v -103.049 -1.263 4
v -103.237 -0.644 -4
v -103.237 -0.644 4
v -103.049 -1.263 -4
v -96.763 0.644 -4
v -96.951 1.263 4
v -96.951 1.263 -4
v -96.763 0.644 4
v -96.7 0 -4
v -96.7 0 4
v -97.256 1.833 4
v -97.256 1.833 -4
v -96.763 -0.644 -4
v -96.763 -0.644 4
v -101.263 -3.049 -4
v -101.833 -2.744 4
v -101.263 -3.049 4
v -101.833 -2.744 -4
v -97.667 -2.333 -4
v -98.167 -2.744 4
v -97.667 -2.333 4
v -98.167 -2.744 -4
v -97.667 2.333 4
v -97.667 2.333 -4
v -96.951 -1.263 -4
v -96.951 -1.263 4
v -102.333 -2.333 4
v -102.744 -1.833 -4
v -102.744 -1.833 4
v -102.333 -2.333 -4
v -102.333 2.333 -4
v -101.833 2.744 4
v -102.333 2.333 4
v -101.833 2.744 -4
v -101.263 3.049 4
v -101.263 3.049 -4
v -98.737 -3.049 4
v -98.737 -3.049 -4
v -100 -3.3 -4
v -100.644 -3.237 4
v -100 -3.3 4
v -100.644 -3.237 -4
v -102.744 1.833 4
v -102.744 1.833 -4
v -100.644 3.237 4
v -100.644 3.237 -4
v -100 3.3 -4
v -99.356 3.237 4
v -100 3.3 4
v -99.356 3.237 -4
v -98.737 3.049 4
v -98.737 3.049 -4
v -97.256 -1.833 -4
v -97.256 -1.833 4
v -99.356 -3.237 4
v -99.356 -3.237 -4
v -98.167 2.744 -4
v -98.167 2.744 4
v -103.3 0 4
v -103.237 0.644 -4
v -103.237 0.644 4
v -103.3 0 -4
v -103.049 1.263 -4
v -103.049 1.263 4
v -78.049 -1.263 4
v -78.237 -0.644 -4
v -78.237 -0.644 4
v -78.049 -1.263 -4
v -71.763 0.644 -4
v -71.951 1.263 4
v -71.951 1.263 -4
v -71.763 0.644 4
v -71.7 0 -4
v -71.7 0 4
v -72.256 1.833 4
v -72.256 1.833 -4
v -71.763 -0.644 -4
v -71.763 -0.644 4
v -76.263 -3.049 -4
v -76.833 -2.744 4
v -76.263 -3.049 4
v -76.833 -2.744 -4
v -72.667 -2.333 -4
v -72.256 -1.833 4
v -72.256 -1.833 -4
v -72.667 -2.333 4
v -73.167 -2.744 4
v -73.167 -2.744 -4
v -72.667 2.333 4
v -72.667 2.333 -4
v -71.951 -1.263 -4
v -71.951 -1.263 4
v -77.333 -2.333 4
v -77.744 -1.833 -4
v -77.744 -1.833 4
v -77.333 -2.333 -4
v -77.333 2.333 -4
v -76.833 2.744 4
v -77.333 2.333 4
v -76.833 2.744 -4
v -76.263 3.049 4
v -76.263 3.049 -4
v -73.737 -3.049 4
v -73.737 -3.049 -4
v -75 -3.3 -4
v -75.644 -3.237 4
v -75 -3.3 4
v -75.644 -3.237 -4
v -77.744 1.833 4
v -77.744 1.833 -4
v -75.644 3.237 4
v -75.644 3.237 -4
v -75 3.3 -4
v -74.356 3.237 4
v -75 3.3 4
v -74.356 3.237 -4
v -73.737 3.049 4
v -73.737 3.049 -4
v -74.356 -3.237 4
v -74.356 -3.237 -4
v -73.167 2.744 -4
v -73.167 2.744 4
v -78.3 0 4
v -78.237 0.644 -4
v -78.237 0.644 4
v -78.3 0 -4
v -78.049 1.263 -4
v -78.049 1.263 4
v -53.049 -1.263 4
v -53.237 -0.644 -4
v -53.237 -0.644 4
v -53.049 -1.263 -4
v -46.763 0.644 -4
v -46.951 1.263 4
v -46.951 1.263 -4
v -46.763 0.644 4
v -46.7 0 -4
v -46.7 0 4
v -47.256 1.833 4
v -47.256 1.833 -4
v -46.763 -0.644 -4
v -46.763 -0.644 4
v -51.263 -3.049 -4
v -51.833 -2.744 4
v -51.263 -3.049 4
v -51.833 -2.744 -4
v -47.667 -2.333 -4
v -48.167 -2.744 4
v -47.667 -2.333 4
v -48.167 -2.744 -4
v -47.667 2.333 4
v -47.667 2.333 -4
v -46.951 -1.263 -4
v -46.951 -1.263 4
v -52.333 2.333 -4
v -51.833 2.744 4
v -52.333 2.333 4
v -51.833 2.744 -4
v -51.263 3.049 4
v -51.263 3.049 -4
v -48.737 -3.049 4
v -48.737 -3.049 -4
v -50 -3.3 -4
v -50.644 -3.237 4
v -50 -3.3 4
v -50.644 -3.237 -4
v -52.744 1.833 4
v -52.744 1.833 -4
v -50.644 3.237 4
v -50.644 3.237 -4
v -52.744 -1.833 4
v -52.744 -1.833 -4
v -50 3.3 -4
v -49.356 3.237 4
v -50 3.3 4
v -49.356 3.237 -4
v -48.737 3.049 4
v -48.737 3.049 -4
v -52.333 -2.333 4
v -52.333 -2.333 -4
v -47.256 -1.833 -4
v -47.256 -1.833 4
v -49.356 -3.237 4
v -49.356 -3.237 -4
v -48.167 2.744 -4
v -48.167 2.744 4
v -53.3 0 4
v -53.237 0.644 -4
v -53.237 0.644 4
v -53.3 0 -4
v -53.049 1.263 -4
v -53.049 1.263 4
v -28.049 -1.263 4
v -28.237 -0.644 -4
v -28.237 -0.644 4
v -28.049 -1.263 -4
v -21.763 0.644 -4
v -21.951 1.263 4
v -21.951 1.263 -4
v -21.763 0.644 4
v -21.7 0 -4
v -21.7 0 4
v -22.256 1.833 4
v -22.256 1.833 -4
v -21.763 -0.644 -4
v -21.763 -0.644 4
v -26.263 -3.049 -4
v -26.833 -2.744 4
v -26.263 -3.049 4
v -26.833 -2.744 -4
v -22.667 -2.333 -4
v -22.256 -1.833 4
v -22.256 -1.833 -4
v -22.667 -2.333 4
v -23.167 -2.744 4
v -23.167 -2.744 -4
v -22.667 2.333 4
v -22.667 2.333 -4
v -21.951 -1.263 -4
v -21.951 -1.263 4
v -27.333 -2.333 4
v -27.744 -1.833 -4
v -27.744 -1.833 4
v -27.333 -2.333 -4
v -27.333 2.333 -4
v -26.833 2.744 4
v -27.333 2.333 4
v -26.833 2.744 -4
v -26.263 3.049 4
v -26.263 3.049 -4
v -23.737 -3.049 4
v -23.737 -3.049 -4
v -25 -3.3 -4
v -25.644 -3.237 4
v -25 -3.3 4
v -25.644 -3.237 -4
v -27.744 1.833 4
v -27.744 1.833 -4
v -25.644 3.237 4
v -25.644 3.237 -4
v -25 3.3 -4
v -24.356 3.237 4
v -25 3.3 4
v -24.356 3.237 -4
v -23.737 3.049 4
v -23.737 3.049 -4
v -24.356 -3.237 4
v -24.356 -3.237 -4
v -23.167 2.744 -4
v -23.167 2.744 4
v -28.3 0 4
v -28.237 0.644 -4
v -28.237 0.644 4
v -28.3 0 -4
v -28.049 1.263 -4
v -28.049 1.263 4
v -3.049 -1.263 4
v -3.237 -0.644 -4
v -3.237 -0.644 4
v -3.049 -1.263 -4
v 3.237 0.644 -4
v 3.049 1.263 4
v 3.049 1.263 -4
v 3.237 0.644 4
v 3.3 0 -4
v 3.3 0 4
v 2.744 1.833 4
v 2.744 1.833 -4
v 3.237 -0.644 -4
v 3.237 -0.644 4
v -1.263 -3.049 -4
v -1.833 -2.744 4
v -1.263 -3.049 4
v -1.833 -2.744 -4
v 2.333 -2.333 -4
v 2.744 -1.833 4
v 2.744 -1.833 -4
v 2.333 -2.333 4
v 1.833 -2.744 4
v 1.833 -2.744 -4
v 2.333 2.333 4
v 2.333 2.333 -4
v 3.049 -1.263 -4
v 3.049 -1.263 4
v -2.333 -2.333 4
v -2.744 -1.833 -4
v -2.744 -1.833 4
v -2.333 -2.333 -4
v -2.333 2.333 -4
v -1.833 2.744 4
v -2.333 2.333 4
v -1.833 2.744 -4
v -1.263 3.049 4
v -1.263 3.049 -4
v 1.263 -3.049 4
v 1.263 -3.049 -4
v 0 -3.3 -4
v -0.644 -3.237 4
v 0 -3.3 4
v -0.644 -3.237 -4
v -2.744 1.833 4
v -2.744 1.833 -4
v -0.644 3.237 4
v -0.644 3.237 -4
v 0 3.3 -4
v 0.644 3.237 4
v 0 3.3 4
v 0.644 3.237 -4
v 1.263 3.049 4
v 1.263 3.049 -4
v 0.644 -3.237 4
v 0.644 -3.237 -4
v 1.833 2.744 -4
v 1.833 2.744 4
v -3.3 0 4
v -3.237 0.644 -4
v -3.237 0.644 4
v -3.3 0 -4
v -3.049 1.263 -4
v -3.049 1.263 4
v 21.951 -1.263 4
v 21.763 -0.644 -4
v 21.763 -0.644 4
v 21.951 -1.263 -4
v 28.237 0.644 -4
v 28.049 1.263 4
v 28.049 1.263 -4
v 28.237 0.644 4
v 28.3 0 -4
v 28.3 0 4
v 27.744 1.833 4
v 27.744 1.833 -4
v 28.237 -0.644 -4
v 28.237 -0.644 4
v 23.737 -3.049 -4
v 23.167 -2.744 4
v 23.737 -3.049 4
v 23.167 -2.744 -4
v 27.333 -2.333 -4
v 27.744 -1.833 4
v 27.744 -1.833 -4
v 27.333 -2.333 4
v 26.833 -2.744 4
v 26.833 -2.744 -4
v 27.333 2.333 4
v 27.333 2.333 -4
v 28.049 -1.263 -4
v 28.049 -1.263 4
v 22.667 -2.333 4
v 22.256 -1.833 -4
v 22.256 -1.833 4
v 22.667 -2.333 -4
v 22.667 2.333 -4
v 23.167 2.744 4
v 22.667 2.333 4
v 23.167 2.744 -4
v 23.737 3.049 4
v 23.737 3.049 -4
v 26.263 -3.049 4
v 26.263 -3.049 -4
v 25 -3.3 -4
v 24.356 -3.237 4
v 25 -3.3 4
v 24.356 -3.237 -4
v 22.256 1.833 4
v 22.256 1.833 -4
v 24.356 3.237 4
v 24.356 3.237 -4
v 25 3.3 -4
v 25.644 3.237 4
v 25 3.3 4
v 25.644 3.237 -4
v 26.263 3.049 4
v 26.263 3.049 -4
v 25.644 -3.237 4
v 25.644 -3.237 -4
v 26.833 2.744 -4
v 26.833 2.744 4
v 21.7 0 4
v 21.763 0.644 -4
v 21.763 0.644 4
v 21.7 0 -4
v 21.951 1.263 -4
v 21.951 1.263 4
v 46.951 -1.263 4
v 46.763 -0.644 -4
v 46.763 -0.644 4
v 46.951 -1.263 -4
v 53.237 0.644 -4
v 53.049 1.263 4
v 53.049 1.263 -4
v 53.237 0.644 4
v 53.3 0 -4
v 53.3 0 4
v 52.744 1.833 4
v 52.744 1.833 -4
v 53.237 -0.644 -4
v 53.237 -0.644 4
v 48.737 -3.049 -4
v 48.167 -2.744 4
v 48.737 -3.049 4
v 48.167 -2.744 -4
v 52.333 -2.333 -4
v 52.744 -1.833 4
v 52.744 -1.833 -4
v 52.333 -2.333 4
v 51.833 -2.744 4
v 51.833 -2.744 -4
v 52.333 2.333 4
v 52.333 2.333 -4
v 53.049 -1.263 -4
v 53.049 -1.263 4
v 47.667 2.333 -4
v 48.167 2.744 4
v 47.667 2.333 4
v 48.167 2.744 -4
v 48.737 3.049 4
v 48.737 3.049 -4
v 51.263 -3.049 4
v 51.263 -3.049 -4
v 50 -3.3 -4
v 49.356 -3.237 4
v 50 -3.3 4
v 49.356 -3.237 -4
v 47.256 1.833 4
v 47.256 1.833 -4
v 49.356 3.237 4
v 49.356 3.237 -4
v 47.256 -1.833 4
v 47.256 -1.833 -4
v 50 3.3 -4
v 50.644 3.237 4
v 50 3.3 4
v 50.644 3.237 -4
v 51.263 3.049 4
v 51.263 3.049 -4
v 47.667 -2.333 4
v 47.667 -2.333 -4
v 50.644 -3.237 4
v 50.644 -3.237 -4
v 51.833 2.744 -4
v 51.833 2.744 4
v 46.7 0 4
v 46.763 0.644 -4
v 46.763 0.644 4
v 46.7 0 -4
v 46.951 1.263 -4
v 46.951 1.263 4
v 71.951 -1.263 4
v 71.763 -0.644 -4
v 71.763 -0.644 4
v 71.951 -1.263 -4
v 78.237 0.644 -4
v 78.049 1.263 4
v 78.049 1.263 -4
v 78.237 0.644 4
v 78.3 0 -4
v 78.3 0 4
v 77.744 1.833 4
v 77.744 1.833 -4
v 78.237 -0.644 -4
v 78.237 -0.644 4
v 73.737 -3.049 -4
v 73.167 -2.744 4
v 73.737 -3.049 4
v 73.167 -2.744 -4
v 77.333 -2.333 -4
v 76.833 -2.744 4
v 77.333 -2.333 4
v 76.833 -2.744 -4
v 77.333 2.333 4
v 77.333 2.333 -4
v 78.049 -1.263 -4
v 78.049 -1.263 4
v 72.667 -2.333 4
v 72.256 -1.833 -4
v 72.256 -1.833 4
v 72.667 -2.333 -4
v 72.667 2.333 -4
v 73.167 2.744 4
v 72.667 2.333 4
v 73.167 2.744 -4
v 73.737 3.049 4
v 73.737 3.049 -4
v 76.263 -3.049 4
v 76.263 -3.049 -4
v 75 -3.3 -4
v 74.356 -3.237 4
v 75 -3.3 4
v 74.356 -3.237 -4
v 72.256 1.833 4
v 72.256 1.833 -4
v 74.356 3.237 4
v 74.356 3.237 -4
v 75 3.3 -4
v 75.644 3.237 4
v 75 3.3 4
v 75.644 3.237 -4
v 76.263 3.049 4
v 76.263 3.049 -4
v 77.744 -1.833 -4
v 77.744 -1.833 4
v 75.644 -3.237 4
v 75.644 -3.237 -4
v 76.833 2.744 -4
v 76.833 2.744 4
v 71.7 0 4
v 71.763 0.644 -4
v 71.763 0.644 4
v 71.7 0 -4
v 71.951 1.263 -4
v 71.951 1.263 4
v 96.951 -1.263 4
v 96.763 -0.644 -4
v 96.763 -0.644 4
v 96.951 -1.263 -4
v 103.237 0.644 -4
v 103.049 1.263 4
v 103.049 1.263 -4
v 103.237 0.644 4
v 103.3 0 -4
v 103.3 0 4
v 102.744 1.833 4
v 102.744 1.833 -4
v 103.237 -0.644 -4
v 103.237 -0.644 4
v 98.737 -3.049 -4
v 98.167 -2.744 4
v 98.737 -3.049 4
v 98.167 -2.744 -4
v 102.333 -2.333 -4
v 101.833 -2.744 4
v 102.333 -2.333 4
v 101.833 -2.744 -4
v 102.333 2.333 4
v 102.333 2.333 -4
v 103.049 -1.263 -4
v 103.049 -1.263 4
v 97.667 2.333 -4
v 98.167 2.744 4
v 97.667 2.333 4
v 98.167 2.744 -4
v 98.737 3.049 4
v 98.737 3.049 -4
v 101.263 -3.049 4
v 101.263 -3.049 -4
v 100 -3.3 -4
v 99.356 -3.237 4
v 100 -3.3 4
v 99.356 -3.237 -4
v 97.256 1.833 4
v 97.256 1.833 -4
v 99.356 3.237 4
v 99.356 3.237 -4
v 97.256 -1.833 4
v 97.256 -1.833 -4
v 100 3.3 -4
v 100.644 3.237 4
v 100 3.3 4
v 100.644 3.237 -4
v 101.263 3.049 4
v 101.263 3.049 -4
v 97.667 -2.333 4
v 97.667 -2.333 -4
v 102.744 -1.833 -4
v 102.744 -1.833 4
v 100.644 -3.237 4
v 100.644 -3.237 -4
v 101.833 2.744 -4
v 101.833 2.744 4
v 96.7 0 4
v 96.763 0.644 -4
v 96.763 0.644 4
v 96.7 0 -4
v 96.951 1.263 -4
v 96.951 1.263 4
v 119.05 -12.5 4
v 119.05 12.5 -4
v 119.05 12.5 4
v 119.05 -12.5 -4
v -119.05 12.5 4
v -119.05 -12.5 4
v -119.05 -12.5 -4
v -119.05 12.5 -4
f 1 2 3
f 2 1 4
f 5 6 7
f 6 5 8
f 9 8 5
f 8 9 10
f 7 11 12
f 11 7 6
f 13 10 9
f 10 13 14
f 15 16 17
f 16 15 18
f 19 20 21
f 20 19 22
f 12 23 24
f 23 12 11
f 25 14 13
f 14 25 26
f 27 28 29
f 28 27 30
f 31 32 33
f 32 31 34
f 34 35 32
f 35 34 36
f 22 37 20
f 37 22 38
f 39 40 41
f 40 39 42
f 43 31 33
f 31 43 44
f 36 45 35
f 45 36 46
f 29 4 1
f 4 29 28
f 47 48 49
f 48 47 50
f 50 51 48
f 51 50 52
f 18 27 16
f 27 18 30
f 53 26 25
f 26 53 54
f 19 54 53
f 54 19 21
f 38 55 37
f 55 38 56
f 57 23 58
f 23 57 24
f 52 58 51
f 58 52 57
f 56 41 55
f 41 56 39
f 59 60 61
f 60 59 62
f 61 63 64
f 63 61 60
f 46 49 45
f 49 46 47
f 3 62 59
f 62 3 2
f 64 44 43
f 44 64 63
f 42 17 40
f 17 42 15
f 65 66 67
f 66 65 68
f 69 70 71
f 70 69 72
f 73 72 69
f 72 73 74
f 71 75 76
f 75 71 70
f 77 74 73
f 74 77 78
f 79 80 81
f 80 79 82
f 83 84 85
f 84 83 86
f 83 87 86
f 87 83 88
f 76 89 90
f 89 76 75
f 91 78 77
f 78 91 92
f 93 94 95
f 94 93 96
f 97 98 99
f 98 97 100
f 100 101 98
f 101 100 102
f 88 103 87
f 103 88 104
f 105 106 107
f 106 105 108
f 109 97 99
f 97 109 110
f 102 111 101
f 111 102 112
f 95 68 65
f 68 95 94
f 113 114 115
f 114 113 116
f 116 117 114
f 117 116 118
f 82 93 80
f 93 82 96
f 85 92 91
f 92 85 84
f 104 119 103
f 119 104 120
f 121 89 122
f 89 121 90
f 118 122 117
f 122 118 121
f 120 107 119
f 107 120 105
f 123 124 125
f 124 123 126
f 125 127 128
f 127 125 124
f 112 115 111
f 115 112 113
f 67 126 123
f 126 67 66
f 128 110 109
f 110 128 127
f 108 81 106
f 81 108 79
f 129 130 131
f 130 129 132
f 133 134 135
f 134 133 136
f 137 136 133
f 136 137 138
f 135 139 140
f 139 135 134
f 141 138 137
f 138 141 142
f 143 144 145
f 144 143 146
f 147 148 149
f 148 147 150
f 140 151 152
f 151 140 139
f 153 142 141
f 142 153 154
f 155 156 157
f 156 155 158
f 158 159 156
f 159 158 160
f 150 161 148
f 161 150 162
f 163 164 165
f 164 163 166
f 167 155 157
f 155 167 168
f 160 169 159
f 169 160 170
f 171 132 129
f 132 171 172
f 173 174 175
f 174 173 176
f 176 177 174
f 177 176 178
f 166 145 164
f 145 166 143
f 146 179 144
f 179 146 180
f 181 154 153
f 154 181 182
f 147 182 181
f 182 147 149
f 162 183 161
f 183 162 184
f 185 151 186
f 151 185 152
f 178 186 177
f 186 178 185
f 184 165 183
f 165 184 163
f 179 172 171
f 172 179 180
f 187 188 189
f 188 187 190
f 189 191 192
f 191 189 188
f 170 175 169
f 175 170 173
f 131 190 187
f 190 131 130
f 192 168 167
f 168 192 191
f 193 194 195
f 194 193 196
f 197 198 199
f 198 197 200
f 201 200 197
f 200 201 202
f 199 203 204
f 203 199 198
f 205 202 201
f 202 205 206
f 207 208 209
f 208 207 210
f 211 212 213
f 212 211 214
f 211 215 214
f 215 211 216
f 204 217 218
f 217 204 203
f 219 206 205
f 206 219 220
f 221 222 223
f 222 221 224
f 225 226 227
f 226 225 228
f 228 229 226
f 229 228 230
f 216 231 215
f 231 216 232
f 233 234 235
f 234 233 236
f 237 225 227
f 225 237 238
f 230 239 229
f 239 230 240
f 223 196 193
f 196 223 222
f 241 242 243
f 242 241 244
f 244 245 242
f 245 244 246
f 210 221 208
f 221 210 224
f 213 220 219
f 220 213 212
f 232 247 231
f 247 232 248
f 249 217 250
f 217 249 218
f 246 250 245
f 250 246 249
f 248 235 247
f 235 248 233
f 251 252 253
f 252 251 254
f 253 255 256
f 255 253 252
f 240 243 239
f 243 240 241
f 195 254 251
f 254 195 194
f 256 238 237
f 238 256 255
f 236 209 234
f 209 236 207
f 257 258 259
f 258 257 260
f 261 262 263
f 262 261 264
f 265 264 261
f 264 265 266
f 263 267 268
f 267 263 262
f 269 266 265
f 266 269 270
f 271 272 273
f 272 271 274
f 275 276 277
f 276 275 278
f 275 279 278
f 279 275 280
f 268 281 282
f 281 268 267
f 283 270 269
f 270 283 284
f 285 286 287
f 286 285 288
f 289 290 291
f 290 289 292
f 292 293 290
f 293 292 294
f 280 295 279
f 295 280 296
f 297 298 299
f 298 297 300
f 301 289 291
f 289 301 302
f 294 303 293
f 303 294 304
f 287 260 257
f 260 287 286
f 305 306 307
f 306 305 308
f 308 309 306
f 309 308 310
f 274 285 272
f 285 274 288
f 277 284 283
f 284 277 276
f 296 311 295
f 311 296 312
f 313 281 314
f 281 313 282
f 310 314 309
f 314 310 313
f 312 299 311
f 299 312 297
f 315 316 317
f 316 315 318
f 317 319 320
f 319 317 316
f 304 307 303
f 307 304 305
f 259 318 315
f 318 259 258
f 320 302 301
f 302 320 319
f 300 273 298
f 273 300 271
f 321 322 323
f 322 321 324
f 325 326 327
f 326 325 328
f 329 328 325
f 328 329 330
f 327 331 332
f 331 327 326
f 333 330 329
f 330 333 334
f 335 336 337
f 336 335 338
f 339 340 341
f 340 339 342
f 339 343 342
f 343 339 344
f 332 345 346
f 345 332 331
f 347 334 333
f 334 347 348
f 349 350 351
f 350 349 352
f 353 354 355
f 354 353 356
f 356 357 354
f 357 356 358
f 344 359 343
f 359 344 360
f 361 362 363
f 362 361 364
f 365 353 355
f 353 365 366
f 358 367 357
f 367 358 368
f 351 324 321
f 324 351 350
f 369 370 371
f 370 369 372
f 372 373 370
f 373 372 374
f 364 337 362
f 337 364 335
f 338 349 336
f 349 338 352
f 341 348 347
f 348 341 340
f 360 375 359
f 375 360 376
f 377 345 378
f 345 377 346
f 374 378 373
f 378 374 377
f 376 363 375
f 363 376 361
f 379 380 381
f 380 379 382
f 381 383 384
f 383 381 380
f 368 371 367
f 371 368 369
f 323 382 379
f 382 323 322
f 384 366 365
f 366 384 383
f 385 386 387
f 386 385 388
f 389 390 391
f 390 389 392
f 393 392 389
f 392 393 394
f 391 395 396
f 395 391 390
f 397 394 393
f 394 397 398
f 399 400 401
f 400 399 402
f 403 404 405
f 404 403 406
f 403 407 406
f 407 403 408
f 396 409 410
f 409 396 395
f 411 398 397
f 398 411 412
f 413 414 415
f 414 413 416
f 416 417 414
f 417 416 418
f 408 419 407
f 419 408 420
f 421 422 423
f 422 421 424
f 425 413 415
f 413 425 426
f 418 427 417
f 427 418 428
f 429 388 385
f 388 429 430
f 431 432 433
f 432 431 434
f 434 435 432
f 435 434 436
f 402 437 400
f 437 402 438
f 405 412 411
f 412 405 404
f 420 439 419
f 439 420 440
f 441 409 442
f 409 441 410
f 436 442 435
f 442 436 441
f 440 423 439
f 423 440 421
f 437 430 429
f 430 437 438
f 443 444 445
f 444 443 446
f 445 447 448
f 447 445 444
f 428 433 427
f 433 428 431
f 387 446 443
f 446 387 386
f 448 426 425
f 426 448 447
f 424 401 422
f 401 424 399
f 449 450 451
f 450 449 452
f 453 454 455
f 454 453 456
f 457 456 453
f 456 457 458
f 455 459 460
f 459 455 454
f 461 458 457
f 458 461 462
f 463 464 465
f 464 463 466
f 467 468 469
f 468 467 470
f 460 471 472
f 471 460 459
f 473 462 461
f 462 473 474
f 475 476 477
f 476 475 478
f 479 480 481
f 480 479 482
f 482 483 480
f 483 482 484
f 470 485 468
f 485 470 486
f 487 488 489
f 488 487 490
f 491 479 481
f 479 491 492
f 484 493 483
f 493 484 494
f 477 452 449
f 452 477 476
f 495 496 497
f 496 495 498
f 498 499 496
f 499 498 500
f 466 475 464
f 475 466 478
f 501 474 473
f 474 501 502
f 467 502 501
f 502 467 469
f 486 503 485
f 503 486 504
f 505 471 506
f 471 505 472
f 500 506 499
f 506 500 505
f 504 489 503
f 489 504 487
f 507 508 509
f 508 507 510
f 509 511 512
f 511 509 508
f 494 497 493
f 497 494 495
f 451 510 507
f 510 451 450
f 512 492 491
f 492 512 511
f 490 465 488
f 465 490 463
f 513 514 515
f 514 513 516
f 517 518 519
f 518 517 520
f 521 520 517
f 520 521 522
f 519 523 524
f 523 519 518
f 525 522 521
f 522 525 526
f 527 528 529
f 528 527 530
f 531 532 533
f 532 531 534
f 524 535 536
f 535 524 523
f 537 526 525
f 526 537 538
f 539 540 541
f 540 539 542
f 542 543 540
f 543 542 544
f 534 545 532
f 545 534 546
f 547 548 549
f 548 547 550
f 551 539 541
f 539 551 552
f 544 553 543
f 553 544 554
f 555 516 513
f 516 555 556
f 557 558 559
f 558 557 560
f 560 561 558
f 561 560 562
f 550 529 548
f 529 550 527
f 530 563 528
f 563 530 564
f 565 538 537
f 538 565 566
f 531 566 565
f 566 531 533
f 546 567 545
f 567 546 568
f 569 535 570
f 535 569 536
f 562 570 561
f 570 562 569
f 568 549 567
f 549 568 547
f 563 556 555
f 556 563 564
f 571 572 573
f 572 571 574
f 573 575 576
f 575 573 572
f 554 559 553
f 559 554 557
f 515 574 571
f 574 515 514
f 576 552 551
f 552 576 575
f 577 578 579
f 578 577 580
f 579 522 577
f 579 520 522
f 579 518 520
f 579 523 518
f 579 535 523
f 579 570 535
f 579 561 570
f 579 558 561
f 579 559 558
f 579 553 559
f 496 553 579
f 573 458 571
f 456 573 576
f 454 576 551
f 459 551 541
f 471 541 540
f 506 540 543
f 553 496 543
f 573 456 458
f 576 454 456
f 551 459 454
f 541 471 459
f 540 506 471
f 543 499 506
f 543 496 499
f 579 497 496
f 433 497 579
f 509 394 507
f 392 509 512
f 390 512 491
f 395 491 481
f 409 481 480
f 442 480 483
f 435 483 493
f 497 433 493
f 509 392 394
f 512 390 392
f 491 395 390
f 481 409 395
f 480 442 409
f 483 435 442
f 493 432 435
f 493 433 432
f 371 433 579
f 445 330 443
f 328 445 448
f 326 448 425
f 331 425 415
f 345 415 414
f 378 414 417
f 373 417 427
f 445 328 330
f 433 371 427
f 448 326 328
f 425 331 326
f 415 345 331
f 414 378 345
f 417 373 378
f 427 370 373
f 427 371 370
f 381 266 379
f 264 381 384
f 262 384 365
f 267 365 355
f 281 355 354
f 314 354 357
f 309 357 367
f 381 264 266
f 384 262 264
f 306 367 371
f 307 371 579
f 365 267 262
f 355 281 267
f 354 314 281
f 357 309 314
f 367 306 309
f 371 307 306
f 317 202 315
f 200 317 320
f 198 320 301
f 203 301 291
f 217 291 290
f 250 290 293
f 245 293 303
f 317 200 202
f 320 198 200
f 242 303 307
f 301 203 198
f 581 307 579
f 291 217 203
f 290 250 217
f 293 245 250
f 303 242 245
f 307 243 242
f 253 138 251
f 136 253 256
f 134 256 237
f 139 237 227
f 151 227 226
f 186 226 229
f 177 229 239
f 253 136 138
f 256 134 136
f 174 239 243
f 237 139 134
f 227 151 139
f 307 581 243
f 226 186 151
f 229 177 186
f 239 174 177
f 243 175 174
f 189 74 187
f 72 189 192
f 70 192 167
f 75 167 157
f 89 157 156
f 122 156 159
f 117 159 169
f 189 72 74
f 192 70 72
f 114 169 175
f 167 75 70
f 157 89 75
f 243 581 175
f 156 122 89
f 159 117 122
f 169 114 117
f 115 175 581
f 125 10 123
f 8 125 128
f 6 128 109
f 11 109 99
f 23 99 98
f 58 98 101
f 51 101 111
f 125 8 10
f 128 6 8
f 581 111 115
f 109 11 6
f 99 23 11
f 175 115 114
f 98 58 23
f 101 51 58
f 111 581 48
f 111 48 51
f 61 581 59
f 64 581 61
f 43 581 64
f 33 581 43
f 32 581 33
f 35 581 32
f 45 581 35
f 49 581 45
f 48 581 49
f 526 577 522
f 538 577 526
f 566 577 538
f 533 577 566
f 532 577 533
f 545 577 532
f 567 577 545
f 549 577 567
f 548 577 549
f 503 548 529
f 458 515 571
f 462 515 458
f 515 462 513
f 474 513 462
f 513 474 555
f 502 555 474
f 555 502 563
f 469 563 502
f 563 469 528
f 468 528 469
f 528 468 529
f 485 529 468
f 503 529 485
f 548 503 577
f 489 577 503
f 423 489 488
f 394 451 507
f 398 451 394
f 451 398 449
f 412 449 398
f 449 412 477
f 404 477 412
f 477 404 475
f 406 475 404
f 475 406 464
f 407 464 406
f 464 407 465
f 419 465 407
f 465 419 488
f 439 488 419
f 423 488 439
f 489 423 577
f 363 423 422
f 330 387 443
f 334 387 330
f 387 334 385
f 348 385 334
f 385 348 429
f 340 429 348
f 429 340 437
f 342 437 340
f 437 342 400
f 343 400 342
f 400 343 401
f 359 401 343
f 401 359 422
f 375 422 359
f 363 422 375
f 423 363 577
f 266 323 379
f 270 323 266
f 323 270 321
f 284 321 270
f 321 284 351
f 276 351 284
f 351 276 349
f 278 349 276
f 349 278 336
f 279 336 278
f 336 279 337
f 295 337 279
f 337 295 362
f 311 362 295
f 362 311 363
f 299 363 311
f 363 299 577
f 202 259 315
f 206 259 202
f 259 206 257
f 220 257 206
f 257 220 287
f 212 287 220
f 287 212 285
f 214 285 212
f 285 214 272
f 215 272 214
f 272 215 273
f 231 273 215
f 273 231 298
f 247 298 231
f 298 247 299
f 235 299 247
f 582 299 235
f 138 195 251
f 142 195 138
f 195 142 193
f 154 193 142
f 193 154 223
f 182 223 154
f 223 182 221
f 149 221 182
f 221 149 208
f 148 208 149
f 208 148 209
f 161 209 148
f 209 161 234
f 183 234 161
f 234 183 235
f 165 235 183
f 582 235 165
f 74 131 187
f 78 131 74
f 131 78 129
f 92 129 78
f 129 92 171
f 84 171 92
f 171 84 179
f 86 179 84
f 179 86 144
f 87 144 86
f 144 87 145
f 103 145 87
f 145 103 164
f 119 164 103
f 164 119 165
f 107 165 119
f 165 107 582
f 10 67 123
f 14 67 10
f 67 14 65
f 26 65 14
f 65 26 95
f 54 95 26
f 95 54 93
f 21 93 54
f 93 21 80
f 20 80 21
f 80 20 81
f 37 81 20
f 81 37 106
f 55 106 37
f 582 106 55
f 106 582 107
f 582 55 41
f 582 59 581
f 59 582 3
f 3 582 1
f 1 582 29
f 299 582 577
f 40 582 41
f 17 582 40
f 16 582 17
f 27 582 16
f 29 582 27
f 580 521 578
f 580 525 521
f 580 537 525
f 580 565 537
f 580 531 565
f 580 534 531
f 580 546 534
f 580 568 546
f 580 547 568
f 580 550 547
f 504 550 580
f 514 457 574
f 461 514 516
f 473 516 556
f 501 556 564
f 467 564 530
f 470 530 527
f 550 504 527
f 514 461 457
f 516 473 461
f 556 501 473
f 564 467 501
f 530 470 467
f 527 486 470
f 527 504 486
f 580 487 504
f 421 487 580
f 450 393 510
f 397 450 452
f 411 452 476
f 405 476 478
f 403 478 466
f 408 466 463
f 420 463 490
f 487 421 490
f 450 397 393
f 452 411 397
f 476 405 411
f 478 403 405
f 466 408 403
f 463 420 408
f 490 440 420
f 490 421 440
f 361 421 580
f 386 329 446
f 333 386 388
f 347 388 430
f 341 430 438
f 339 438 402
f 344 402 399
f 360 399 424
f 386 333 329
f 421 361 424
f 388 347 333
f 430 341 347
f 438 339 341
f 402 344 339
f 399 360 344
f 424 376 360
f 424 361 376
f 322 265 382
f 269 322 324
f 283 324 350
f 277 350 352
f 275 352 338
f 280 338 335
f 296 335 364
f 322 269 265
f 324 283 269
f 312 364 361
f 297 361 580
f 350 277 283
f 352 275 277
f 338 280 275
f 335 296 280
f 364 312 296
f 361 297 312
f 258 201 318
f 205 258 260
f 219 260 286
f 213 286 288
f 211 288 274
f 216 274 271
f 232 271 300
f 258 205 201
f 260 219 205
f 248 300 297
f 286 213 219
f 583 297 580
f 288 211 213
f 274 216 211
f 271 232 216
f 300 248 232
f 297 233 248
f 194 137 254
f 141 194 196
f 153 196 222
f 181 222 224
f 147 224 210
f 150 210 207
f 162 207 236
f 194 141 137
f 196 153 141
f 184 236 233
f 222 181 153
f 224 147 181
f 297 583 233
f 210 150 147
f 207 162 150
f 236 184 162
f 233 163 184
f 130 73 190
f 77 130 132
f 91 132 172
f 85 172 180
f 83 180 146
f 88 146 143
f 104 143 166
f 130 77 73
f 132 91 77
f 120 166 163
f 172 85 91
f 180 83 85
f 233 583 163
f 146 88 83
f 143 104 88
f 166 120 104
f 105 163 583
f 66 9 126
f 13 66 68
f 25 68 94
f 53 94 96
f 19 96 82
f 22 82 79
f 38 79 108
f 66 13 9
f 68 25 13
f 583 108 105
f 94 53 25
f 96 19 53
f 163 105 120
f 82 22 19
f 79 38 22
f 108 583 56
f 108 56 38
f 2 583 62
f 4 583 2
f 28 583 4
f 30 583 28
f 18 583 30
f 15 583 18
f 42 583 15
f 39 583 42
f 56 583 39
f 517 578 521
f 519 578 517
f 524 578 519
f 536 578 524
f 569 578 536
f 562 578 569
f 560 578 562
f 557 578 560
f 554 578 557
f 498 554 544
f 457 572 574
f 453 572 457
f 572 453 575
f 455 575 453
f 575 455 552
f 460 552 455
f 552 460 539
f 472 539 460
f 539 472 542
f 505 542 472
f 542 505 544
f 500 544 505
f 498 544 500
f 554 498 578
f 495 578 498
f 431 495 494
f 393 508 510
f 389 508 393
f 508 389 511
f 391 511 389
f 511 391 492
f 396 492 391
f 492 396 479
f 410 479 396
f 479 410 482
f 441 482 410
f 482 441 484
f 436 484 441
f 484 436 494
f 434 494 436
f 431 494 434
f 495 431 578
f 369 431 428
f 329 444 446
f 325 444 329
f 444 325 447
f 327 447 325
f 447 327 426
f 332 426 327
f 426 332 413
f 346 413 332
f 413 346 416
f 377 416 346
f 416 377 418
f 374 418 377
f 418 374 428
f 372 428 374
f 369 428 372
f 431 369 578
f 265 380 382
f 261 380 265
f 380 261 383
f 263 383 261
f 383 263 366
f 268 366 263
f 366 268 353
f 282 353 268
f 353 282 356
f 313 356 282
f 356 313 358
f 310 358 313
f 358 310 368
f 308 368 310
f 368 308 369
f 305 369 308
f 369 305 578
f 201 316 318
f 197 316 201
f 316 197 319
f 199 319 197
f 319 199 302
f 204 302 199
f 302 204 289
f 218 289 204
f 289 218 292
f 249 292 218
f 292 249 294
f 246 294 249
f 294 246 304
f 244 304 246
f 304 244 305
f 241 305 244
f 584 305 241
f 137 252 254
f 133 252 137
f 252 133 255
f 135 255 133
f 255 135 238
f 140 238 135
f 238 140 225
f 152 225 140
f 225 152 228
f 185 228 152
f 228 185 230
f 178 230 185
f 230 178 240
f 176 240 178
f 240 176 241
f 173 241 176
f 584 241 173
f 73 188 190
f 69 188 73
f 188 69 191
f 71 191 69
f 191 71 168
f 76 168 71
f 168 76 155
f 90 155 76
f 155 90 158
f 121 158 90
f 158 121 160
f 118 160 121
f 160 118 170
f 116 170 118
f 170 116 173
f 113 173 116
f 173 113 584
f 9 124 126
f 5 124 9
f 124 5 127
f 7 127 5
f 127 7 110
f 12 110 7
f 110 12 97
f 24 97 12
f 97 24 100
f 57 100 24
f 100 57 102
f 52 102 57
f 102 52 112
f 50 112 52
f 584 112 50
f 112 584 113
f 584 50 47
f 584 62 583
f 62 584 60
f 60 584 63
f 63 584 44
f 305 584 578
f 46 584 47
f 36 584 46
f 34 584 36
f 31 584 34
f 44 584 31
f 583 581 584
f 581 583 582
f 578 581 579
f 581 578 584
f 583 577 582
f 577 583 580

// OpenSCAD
$fn = 32;

// ----------------------------------------------------------------------
// Hole bar, 9 x Ø6.6
// row layout, 19.05 mm edge offset
// ----------------------------------------------------------------------

// --- parameters (mm) ---
bar_w = 25;    // bar width (Y)
bar_t = 8;     // bar thickness (Z)
holes = 9;     // holes per row
hole_d = 6.6;  // hole diameter
edge = 19.05;  // offset from the bar end to the first hole
pitch = 25;    // pitch between neighbouring holes

// --- derived feature positions (mm) ---
span = (holes - 1) * pitch;   // = 200   distance between the end holes
bar_l = span + 2 * edge;      // = 238.1   overall bar length
start_x = -bar_l / 2 + edge;  // = -100   X of the first hole
feature_centers = [
  [start_x + 0 * pitch, 0],
  [start_x + 1 * pitch, 0],
  [start_x + 2 * pitch, 0],
  [start_x + 3 * pitch, 0],
  [start_x + 4 * pitch, 0],
  [start_x + 5 * pitch, 0],
  [start_x + 6 * pitch, 0],
  [start_x + 7 * pitch, 0],
  [start_x + 8 * pitch, 0]
];   // hole centres of the first row

// bar with one row of holes, drilled from feature_centers
difference() {
  translate([-bar_l / 2, -bar_w / 2, -bar_t / 2]) cube([bar_l, bar_w, bar_t]);
  for (centre = feature_centers)
    translate([centre[0], centre[1], 0])
      cylinder(d = hole_d, h = bar_t + 2, center = true);
}
